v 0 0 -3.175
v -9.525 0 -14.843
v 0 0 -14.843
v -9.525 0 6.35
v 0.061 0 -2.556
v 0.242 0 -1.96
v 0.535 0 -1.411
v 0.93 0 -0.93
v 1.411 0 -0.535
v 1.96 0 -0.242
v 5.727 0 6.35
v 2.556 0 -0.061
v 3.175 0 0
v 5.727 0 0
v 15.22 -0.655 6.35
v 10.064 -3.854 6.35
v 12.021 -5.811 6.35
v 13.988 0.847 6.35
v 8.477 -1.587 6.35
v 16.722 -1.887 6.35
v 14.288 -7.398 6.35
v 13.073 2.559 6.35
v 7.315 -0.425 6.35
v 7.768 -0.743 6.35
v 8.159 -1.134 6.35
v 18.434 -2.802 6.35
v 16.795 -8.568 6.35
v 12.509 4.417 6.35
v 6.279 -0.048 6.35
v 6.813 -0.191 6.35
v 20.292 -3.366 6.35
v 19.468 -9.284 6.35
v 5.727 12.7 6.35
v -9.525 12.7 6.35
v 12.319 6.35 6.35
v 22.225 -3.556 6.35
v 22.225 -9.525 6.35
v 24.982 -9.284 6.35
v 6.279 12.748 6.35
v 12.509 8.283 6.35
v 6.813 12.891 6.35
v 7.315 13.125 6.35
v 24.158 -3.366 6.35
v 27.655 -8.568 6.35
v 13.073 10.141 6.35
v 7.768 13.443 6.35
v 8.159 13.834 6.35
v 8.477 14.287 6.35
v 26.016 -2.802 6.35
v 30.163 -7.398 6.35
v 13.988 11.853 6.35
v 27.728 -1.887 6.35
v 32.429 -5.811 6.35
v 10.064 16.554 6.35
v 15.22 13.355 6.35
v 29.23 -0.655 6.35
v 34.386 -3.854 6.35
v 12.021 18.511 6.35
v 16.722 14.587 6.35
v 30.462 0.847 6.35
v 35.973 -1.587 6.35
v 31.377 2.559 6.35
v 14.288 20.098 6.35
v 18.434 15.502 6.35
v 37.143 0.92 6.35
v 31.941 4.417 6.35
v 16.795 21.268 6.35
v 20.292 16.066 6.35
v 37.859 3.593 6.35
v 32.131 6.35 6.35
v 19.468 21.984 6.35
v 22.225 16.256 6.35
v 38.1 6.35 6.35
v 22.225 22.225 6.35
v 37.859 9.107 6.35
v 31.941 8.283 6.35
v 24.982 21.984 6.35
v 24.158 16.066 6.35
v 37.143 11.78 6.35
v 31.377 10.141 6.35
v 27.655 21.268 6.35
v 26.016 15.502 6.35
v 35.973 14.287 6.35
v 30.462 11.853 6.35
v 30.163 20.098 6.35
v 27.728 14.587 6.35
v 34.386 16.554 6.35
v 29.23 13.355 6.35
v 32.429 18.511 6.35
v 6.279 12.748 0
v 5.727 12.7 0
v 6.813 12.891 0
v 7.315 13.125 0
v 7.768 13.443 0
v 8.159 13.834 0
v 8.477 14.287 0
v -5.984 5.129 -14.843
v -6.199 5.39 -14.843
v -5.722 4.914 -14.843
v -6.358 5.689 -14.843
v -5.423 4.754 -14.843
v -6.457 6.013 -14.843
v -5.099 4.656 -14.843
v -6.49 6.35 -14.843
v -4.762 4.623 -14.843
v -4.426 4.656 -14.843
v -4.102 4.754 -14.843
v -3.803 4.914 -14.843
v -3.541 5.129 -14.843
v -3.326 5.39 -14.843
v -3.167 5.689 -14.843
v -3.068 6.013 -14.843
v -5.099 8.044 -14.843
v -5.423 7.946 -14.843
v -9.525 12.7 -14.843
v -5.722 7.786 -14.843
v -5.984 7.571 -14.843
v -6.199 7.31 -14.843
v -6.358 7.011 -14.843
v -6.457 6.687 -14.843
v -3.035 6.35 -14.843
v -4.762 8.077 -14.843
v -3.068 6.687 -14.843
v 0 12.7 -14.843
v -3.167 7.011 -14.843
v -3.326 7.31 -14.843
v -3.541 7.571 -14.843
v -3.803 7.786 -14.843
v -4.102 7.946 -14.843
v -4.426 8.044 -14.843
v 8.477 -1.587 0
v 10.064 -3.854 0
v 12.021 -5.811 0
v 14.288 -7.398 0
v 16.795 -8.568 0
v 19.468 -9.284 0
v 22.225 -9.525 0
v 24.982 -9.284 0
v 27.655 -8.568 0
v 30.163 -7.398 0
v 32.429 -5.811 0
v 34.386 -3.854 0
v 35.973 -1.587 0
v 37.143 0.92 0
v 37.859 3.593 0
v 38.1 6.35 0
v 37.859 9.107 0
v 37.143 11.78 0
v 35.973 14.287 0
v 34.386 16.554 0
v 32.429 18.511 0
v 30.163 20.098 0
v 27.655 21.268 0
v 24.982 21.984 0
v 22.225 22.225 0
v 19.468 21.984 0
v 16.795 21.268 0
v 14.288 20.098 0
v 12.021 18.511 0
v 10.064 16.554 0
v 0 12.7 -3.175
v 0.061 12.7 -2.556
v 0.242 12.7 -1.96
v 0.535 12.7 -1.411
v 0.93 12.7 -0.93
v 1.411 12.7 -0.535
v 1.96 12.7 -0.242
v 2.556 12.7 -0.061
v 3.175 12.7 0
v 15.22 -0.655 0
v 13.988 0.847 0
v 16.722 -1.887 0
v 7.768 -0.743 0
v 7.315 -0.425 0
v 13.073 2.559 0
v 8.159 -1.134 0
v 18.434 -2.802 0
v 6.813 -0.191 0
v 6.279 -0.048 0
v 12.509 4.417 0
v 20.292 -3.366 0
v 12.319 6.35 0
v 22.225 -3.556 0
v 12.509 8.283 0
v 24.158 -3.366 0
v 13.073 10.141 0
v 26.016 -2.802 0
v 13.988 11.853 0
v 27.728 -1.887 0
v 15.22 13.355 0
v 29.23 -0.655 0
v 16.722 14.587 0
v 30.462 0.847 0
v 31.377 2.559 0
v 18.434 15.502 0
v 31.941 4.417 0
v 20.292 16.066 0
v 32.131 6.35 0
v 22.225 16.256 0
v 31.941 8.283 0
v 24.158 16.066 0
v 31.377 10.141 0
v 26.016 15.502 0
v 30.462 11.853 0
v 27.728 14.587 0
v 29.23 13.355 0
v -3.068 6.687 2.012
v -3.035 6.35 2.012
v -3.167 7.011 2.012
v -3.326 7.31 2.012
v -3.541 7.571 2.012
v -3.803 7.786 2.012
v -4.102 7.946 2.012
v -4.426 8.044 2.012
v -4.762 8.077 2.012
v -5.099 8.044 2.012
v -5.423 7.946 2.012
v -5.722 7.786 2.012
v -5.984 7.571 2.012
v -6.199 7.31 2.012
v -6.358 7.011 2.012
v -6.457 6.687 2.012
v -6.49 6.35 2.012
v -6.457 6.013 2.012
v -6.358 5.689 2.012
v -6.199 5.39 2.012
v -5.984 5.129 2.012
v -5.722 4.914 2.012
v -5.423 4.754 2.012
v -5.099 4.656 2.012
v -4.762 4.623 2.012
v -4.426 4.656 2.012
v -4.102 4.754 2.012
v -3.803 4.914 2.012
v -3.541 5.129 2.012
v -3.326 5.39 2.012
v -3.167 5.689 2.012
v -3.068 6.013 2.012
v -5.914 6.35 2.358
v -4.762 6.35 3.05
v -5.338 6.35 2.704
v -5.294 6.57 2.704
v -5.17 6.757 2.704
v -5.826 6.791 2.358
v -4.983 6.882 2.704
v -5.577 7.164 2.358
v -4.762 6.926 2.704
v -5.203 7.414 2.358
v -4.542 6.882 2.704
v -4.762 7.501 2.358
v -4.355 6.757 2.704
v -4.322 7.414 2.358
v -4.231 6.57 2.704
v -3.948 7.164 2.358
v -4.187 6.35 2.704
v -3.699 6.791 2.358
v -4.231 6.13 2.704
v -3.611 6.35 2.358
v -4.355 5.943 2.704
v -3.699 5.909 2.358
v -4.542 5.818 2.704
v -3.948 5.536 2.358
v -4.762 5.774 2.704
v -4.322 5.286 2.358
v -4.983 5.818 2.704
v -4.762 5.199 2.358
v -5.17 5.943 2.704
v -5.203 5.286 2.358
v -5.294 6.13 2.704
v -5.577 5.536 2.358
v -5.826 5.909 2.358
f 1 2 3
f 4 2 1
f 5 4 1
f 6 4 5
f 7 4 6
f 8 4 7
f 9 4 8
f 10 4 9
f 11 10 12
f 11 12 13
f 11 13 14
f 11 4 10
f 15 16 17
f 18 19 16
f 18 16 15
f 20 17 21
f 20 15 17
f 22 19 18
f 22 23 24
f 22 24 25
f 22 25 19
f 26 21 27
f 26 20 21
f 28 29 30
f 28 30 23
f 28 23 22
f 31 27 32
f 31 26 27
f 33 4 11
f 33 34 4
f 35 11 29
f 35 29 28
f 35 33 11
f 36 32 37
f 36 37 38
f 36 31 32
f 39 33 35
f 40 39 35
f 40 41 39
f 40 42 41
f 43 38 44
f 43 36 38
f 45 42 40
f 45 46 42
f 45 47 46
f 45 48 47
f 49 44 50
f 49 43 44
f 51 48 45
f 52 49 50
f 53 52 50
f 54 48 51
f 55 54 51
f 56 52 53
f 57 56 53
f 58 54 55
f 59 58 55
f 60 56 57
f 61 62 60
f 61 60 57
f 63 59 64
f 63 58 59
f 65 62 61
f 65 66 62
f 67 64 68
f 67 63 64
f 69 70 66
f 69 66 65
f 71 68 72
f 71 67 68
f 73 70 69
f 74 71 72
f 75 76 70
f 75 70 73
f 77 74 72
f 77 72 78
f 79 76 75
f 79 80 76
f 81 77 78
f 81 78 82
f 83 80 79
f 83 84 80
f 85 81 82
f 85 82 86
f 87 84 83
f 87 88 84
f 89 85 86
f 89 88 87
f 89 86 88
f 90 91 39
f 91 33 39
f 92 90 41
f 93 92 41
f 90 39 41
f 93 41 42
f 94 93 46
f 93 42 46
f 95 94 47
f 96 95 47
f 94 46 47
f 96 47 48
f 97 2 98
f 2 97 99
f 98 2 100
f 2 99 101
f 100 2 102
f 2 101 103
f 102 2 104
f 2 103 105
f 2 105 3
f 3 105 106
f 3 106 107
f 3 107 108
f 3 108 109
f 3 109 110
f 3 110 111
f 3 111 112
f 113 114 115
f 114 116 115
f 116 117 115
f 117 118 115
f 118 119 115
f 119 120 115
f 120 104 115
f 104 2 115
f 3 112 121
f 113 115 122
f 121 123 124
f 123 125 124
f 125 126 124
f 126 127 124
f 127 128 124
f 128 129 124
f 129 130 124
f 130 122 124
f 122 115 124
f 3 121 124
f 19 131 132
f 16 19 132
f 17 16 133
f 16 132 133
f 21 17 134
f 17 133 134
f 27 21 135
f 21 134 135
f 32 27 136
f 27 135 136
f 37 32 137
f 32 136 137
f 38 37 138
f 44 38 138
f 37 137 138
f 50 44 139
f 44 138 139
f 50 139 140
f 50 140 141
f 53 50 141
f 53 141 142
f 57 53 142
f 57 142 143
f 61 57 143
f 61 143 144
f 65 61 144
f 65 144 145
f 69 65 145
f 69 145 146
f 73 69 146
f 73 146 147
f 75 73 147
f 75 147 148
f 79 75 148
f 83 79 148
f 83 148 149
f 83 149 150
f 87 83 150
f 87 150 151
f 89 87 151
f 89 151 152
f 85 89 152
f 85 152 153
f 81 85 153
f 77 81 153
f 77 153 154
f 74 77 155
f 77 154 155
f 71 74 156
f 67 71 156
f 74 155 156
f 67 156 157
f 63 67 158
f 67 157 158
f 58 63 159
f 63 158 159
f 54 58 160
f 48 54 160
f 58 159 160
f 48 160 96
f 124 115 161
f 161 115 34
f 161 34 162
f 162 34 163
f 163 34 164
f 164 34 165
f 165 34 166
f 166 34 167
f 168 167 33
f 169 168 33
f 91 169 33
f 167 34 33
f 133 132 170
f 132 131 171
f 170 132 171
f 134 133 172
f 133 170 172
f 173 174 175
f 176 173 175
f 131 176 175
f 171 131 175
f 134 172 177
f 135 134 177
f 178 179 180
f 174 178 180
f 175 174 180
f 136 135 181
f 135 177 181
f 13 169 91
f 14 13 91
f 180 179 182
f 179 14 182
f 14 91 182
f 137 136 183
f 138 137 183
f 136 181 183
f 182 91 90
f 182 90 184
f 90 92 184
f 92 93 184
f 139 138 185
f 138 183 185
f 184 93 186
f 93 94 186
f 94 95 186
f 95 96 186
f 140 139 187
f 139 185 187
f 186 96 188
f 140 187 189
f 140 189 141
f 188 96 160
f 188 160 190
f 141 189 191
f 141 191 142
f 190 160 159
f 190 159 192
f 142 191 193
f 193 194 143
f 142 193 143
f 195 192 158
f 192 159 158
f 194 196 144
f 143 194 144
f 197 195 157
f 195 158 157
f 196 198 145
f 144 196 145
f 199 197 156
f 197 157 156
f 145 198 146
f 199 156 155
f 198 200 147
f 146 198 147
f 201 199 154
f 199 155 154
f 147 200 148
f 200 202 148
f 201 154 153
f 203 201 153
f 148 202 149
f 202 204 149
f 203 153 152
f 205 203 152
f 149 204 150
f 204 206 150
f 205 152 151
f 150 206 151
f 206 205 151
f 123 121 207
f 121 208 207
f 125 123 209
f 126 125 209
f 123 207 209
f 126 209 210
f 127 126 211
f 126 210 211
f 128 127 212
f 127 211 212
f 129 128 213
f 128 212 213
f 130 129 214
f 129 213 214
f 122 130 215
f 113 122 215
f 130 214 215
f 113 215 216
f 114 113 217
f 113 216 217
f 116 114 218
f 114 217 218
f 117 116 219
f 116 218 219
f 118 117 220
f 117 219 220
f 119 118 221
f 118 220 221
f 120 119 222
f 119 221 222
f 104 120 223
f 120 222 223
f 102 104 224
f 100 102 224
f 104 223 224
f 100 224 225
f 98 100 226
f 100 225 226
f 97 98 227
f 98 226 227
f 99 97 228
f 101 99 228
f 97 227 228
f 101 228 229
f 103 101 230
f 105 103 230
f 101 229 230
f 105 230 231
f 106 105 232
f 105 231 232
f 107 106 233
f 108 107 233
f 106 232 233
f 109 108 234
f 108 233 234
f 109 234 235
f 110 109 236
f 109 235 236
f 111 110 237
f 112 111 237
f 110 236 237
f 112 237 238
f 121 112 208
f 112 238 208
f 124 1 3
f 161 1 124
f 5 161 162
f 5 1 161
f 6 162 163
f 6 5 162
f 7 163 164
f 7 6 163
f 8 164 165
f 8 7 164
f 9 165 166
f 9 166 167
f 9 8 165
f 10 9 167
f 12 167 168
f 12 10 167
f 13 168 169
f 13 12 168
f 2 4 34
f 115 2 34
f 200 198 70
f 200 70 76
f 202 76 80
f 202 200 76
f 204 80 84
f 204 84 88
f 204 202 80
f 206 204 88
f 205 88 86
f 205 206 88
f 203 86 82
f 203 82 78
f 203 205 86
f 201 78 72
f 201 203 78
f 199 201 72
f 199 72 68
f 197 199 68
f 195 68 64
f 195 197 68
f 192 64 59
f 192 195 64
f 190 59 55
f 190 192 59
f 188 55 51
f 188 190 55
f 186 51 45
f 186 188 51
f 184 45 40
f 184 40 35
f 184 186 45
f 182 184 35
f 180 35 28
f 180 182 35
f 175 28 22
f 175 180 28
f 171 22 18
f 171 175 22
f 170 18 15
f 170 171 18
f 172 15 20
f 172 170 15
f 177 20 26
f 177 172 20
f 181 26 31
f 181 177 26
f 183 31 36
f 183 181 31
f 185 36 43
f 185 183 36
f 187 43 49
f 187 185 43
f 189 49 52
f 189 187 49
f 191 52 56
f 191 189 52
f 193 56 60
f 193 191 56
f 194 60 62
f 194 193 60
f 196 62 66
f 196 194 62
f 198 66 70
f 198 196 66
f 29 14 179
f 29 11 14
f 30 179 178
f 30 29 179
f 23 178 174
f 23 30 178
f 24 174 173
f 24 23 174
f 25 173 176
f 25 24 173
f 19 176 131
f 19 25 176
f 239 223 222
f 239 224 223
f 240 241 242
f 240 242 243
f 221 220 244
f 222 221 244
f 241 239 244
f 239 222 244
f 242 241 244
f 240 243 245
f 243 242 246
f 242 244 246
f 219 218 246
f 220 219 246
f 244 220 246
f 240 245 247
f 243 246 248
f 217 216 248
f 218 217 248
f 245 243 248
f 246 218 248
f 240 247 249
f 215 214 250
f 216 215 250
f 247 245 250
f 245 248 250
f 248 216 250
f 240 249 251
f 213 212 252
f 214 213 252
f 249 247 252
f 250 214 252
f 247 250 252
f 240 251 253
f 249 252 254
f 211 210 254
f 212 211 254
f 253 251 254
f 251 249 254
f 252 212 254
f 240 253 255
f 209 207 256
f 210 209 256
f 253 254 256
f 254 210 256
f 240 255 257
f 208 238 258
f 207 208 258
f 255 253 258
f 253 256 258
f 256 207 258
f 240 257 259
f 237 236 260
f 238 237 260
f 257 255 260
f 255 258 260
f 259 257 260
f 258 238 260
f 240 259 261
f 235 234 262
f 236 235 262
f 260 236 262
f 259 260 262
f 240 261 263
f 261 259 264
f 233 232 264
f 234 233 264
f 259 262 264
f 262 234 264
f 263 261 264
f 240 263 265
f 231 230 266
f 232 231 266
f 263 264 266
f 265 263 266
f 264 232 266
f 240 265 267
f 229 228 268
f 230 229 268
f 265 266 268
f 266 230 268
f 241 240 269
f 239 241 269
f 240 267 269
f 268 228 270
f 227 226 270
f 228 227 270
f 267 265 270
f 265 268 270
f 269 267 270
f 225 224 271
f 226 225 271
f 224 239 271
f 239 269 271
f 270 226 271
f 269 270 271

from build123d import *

# Parameters (mm, degrees)
SKETCH1_R                 = 9.906
BOSS_EXTRUDE1_DEPTH       = 6.35
SKETCH2_W                 = 9.525
SKETCH2_H                 = 12.7
BOSS_EXTRUDE2_DEPTH       = 21.193
F_8_32_TAPPED_HOLE1_D     = 3.4544
F_8_32_TAPPED_HOLE1_DEPTH = 16.85544
F_8_32_TAPPED_HOLE1_TIP   = 1.037806461
FILLET1_R                 = 3.175


with BuildPart() as part:
    # Sketch1 → Boss-Extrude1 (new body)
    with BuildSketch(Plane.XY):
        with BuildLine():
            Line((7.675322169, 12.7), (0, 12.7))
            Line((0, 12.7), (0, 0))
            Line((0, 0), (7.675322169, 0))
            ThreePointArc((7.675322169, 0), (38.1, 6.35), (7.675322169, 12.7))
        make_face()
        with Locations((22.225, 6.35)):
            Circle(SKETCH1_R, mode=Mode.SUBTRACT)
    extrude(amount=BOSS_EXTRUDE1_DEPTH)

    # Sketch2 → Boss-Extrude2 (add)
    with BuildSketch(Plane.XY.offset(6.35)):
        with Locations((-4.7625, 6.35)):
            Rectangle(SKETCH2_W, SKETCH2_H)
    extrude(amount=-BOSS_EXTRUDE2_DEPTH)

    # #8-32 Tapped Hole1
    with Locations(Plane(origin=(0, 0, -14.843), x_dir=(-1, 0, 0), z_dir=(0, 0, -1))):
        with Locations((4.7625, 6.35)):
            Hole(F_8_32_TAPPED_HOLE1_D / 2, depth=F_8_32_TAPPED_HOLE1_DEPTH)
            with Locations((0, 0, -(F_8_32_TAPPED_HOLE1_DEPTH + F_8_32_TAPPED_HOLE1_TIP / 2))):  # 118° drill point
                Cone(0, F_8_32_TAPPED_HOLE1_D / 2, F_8_32_TAPPED_HOLE1_TIP, mode=Mode.SUBTRACT)

    # Fillet1
    fillet1_edges = [part.edges().sort_by_distance(p)[0] for p in [
        (0, 6.35, 0),
        (7.675322169, 12.7, 3.175),
        (7.675322169, 0, 3.175),
    ]]
    fillet(fillet1_edges, radius=FILLET1_R)


solid = part.part
